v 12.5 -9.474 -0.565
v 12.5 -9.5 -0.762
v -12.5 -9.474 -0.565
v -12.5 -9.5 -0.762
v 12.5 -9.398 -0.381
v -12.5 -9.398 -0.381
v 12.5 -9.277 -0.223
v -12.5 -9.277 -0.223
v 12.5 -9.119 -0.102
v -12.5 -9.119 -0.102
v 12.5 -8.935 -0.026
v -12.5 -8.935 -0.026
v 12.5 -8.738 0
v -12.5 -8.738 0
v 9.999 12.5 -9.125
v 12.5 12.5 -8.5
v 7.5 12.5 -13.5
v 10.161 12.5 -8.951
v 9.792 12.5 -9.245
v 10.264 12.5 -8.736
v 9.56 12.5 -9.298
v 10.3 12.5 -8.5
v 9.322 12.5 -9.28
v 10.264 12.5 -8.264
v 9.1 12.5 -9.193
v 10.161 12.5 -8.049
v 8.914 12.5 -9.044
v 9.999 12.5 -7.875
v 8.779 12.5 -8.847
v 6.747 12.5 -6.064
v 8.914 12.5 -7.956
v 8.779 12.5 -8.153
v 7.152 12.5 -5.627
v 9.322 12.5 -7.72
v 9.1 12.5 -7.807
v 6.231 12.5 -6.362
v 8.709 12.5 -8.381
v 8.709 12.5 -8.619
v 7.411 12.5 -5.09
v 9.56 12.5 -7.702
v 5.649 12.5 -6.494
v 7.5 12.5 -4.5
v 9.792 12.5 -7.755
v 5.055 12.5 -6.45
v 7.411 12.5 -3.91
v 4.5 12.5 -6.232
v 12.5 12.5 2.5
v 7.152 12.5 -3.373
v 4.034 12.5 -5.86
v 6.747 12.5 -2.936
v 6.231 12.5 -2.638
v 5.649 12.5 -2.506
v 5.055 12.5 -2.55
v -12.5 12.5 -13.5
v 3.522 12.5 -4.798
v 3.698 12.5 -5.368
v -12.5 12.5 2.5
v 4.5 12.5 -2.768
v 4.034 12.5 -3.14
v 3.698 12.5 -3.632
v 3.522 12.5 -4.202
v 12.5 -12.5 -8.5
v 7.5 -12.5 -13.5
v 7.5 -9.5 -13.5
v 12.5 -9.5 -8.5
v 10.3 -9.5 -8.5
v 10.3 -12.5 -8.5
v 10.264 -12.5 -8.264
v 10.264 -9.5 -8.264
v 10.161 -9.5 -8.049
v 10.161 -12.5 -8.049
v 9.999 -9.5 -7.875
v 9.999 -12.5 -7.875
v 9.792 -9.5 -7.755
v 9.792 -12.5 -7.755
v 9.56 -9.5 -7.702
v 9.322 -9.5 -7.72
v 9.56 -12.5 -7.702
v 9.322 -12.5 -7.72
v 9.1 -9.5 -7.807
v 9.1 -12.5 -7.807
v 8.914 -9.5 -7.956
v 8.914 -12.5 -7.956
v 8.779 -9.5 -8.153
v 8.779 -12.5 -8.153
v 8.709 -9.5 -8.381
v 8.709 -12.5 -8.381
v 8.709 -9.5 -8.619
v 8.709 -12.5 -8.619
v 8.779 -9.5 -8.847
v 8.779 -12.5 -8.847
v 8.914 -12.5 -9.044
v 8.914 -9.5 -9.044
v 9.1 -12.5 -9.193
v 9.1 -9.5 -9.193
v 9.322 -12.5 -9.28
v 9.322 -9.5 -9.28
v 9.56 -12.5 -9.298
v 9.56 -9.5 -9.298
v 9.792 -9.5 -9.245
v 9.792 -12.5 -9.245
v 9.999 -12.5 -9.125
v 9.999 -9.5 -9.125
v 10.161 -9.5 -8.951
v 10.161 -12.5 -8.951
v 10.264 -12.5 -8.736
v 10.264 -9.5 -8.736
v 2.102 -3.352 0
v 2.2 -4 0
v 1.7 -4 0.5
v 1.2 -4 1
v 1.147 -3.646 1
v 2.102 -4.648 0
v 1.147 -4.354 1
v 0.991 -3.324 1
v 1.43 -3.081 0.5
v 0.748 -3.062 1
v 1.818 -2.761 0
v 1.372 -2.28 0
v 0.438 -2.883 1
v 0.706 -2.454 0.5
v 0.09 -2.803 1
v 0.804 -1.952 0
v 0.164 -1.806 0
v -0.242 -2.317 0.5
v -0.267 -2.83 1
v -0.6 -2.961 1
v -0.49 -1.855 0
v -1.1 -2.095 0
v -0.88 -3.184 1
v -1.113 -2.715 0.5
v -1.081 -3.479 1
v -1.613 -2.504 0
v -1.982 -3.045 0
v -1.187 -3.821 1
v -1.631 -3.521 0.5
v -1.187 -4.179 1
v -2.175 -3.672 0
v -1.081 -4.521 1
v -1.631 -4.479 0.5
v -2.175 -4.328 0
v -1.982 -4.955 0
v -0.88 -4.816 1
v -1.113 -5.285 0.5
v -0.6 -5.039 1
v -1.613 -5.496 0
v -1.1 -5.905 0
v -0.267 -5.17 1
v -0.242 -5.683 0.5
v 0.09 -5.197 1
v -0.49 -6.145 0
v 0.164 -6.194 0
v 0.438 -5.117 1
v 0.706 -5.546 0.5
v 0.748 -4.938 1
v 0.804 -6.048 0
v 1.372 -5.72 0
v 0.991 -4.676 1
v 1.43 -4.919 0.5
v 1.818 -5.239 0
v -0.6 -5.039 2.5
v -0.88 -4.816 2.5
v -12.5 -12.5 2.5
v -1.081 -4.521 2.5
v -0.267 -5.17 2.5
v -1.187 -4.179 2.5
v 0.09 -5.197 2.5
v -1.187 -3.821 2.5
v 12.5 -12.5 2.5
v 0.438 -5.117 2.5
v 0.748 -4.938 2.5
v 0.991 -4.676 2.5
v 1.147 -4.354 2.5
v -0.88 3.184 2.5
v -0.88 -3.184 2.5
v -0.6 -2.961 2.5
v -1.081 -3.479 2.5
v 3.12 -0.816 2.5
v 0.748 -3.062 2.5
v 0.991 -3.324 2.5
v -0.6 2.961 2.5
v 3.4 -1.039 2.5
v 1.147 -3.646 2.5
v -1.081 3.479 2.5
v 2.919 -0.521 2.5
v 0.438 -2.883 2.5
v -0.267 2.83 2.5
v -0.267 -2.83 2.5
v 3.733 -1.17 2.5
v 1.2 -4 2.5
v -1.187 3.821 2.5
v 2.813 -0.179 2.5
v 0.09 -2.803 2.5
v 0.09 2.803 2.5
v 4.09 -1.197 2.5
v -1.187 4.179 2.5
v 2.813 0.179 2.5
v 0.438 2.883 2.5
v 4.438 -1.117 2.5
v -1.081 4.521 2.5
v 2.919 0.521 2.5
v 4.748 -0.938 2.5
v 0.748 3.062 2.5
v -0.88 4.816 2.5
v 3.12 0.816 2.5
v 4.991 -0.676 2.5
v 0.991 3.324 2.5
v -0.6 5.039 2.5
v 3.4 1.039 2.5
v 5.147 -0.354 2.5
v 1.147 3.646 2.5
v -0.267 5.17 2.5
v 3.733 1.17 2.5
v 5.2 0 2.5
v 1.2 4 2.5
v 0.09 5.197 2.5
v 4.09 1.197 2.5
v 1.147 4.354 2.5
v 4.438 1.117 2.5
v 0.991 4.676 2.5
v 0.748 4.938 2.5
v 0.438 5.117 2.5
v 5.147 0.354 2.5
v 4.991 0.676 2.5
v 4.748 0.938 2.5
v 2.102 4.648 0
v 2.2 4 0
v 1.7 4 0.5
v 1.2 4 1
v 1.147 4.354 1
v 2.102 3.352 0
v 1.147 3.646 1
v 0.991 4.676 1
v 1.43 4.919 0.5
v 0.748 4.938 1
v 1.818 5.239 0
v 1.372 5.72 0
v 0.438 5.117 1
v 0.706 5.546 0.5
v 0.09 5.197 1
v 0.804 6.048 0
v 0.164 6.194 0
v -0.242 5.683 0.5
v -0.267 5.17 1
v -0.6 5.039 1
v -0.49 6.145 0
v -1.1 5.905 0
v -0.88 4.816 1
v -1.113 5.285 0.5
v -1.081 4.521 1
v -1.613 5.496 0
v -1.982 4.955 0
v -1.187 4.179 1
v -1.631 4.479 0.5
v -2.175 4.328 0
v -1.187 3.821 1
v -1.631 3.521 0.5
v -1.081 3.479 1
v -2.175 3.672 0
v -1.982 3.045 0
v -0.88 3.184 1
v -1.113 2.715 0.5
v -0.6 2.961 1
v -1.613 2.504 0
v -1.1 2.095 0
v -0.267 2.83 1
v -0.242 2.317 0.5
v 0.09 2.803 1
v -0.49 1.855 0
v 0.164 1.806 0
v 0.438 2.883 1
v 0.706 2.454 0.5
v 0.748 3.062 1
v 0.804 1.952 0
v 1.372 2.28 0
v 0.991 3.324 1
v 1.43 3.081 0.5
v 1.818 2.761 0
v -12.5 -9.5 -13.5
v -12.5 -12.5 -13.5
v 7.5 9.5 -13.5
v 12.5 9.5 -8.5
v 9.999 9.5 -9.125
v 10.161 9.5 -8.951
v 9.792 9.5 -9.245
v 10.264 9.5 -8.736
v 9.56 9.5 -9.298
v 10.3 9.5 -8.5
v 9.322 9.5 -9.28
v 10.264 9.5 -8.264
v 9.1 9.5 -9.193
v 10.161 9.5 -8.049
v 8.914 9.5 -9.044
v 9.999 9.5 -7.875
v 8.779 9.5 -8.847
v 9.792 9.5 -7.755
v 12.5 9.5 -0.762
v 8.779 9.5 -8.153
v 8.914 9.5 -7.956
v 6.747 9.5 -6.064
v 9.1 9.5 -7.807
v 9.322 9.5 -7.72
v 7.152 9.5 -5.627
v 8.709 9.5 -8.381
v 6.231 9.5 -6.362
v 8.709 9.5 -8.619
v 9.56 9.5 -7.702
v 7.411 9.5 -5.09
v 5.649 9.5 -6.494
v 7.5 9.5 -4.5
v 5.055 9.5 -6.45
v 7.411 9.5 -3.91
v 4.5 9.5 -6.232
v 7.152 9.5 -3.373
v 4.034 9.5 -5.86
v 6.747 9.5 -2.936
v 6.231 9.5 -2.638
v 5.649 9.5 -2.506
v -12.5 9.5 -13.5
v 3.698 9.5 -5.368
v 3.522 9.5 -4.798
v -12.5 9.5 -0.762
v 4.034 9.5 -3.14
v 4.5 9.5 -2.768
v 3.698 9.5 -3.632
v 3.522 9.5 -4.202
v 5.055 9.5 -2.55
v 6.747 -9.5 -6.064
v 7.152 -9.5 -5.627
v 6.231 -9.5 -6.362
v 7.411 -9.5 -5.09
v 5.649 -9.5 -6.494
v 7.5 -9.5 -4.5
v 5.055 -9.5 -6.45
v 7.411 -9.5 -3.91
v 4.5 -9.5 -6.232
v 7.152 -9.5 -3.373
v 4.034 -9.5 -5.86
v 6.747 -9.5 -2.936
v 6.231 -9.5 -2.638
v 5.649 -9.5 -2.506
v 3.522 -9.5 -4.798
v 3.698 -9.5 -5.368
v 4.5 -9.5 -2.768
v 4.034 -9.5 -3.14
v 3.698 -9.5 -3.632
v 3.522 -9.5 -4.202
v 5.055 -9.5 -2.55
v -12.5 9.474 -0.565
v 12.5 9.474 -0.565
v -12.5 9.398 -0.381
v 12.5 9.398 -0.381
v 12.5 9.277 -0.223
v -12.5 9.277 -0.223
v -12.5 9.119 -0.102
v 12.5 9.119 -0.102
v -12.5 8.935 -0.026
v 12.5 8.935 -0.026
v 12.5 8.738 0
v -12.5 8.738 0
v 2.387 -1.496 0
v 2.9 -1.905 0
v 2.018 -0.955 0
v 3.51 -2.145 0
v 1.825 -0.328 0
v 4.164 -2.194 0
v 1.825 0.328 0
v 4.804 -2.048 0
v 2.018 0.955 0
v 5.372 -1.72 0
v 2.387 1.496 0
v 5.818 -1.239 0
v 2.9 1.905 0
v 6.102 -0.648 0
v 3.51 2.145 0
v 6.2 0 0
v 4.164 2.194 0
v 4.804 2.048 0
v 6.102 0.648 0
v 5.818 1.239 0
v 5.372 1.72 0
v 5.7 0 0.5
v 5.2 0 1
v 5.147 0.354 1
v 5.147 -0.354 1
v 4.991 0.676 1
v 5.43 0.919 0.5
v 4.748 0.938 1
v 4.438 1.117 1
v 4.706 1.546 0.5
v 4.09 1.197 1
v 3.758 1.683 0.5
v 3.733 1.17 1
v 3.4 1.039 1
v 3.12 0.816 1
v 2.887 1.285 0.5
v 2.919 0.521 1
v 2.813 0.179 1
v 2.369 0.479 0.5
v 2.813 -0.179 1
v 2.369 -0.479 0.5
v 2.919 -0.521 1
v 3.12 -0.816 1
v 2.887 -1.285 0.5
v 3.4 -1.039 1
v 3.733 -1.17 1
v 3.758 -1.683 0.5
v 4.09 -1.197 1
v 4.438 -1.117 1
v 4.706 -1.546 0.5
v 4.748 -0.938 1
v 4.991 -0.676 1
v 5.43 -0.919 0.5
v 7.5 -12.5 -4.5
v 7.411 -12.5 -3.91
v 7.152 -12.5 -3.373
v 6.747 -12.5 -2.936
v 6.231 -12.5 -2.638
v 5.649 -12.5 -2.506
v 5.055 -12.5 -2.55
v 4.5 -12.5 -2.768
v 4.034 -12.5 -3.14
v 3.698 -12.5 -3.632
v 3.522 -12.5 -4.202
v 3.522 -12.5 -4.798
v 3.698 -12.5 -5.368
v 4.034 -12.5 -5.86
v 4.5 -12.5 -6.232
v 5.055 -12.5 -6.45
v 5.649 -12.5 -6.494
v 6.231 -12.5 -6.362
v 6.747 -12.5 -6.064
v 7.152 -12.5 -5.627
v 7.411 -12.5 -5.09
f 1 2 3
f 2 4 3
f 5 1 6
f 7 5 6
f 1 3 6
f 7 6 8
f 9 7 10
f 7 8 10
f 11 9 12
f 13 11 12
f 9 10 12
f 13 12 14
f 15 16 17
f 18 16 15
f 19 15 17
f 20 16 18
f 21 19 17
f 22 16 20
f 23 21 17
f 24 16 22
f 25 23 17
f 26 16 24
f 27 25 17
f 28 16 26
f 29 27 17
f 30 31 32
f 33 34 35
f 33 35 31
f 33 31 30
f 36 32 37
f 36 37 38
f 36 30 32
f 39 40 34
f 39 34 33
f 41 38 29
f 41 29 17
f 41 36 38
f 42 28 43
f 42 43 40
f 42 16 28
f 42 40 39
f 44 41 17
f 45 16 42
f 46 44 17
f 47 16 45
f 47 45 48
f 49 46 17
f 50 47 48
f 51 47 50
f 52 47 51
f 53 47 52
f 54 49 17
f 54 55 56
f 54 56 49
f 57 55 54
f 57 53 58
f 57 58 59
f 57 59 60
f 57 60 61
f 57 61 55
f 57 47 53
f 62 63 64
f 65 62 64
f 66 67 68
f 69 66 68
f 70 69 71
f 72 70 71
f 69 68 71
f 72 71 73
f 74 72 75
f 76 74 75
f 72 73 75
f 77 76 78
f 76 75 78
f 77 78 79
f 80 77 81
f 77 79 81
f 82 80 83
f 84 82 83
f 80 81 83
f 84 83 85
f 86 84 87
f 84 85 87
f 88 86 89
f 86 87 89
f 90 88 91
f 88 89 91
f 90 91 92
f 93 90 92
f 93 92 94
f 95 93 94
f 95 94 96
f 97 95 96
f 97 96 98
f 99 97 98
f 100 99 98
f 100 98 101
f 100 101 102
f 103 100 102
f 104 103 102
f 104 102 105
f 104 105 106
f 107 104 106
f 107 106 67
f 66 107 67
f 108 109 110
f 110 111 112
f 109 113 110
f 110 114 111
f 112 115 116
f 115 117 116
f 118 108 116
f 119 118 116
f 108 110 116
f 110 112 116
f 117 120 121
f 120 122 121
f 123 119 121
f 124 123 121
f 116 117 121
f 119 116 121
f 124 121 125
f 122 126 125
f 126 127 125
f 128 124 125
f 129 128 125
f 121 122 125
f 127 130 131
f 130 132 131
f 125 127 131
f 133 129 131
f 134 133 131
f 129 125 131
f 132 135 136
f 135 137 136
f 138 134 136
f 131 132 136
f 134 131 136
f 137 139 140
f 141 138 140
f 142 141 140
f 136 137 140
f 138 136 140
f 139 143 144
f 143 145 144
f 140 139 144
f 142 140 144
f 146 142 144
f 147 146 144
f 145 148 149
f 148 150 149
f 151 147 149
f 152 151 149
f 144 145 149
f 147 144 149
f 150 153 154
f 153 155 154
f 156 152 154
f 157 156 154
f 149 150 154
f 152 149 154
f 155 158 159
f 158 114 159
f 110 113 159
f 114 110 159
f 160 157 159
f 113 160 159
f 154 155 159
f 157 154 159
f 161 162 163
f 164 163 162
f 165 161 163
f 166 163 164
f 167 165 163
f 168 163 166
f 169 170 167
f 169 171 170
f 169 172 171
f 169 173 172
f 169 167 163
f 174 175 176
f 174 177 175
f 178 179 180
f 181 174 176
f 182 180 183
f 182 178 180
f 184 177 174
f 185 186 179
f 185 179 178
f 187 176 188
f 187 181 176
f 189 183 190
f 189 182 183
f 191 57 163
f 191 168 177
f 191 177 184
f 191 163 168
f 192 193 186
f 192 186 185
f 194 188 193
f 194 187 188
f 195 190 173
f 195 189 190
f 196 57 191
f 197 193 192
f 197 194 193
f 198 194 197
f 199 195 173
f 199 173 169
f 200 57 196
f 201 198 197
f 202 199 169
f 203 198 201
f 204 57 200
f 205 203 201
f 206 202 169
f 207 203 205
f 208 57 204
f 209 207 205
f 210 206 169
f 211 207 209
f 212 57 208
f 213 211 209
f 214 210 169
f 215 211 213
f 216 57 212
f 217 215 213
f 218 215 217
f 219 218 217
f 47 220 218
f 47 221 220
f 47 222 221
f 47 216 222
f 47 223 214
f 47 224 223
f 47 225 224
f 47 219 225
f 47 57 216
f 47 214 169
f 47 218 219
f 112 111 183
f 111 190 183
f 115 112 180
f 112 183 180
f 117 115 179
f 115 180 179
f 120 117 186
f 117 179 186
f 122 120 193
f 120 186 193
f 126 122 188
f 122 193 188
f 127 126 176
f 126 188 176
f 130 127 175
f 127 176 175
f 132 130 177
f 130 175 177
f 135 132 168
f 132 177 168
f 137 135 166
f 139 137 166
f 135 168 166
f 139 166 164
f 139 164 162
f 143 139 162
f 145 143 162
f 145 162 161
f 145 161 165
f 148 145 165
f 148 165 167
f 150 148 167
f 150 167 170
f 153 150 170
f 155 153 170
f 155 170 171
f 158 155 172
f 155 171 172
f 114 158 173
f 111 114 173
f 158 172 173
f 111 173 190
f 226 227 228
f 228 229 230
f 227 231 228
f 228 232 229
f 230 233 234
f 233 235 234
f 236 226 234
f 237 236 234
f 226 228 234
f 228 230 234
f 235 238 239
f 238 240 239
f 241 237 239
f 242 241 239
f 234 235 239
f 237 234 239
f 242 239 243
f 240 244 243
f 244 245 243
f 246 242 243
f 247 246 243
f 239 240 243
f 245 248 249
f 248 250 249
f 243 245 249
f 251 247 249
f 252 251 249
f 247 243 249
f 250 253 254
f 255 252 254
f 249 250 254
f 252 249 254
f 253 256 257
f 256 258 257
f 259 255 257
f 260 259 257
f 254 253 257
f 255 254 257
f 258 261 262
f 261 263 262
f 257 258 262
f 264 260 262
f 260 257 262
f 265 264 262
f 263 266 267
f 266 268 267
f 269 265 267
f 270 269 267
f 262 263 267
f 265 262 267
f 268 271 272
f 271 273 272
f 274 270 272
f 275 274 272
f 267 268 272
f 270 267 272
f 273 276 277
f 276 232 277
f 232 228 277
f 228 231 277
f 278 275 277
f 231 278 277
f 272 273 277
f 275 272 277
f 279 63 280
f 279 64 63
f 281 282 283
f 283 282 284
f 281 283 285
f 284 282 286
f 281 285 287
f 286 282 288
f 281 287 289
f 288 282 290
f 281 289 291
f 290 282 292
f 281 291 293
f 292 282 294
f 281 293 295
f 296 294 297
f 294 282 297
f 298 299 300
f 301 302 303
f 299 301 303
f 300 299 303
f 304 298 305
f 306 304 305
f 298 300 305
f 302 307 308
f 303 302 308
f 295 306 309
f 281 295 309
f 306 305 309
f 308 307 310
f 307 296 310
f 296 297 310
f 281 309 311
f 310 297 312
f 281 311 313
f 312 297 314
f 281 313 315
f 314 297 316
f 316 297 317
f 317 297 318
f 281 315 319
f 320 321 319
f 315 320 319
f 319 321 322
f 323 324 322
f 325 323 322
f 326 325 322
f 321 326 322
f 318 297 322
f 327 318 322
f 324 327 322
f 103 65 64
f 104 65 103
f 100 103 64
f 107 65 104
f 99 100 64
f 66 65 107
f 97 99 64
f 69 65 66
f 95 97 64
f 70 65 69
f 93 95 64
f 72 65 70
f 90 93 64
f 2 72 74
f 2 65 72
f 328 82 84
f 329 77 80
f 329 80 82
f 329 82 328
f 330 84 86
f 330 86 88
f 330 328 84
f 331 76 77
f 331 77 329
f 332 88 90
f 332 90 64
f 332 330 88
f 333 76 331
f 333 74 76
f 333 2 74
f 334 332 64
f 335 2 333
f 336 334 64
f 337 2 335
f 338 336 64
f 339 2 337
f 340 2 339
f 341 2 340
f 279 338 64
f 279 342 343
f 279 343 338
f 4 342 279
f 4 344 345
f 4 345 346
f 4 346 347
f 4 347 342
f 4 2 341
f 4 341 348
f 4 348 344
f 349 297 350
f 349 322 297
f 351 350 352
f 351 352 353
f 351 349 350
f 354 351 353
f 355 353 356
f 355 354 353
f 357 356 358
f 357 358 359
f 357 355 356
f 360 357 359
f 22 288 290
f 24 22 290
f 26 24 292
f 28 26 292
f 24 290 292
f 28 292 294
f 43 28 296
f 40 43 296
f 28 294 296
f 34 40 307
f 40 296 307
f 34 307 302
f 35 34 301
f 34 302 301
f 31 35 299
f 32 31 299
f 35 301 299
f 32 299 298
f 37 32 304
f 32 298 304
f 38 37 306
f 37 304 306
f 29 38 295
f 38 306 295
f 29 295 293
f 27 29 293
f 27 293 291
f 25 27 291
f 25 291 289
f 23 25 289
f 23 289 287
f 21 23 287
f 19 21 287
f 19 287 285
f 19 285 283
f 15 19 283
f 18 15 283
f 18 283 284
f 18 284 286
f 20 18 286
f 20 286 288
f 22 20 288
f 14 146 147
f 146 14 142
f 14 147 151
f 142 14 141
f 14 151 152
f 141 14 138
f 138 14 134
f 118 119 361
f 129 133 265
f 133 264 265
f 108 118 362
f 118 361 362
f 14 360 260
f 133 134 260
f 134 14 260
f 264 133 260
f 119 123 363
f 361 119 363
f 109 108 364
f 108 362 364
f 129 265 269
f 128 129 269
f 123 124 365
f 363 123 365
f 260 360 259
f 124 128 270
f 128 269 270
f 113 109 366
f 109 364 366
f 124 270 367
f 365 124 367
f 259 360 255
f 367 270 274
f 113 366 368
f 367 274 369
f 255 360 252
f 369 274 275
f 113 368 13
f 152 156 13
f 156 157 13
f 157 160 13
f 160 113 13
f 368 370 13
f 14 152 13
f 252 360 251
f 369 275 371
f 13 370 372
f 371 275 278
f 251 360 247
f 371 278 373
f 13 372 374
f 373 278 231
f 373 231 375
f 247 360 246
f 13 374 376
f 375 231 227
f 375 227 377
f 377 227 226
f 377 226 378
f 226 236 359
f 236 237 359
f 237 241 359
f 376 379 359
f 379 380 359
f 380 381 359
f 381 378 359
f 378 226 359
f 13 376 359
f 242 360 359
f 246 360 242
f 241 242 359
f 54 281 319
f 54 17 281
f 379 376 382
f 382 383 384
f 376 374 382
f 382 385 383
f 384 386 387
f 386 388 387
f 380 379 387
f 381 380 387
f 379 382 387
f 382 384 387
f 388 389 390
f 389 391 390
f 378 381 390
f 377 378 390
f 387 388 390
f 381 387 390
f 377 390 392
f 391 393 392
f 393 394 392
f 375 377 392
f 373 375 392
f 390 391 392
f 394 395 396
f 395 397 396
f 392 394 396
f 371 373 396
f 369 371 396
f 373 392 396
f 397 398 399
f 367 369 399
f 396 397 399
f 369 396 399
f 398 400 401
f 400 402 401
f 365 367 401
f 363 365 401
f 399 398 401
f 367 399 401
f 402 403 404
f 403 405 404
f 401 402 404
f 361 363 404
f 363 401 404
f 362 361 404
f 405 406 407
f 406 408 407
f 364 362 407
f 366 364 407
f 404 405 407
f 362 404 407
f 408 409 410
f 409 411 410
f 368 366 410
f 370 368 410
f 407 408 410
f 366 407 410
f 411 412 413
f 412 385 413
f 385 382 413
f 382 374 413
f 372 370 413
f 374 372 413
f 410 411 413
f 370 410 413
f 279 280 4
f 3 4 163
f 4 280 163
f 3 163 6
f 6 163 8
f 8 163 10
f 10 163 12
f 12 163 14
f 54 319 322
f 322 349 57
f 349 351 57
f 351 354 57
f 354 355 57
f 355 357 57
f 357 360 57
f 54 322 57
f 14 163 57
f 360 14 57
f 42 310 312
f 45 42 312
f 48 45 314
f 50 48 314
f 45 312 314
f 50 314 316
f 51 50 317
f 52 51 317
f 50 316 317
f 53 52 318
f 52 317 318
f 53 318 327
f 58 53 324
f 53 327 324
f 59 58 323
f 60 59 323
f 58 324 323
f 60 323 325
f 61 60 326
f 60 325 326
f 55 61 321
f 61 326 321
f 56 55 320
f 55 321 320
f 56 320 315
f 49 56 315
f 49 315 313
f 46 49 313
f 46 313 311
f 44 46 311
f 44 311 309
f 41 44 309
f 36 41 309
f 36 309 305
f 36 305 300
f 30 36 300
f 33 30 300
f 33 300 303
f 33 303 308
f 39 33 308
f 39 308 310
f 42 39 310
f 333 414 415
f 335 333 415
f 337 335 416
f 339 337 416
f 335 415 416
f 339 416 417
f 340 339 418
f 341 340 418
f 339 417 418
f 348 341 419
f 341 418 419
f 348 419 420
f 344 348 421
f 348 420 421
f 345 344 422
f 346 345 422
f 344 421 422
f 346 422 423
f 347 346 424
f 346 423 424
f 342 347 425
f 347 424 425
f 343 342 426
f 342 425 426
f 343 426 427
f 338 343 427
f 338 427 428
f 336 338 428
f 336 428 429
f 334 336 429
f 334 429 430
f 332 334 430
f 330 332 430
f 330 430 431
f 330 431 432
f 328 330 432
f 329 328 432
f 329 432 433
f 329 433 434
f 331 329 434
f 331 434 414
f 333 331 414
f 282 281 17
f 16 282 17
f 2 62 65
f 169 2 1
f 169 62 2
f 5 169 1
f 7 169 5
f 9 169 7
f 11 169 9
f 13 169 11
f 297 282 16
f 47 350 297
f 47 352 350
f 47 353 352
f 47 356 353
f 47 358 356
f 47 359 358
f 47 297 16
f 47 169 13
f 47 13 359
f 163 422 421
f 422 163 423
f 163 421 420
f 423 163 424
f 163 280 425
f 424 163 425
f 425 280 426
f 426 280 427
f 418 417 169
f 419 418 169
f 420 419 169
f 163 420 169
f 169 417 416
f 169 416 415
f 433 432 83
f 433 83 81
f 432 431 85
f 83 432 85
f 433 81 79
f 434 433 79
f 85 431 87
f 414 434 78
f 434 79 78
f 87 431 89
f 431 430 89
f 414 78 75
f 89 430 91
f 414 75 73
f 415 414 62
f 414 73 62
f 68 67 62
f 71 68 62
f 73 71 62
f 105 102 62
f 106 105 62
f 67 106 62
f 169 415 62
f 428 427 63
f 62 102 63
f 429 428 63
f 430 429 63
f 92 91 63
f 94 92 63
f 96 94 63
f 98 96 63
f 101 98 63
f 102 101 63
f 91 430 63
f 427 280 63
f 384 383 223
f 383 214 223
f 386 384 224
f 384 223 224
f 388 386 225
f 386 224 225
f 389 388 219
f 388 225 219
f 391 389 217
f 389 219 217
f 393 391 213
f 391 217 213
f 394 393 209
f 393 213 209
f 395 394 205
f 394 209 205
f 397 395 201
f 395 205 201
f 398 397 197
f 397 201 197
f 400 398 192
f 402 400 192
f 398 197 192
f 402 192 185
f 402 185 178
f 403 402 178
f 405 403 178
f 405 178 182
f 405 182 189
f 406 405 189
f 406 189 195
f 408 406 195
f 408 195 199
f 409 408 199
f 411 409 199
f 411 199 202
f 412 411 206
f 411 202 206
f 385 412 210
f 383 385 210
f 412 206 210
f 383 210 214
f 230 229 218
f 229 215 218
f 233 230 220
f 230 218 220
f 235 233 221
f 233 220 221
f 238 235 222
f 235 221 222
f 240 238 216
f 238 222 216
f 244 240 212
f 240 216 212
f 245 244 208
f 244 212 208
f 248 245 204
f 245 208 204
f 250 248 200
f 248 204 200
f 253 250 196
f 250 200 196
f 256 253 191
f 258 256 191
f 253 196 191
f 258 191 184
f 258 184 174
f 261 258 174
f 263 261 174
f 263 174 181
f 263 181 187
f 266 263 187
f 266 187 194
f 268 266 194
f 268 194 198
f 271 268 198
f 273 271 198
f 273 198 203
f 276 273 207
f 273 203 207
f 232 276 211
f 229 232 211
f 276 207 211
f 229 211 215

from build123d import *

# Parameters (mm, degrees)
SKETCH1_W                                       = 25
SKETCH1_H                                       = 25
BOSS_EXTRUDE1_DEPTH                             = 2.5
SKETCH2_W                                       = 25
SKETCH2_H                                       = 3
BOSS_EXTRUDE2_DEPTH                             = 13.5
SKETCH10_R                                      = 2
CUT_EXTRUDE1_DEPTH                              = 26
SKETCH10_3_R                                    = 0.8
CUT_EXTRUDE2_DEPTH                              = 26
FILLET1_R                                       = 0.762
CHAMFER1_SIZE                                   = 5
CSK_FOR_M2_FLAT_HEAD_MACHINE_SCREW1_D           = 2.4
CSK_FOR_M2_FLAT_HEAD_MACHINE_SCREW1_CSINK_D     = 4.4
CSK_FOR_M2_FLAT_HEAD_MACHINE_SCREW1_CSINK_ANGLE = 90


with BuildPart() as part:
    # Sketch1 → Boss-Extrude1 (new body)
    with BuildSketch(Plane.XY):
        Rectangle(SKETCH1_W, SKETCH1_H)
    extrude(amount=BOSS_EXTRUDE1_DEPTH)

    # Sketch2 → Boss-Extrude2 (add)
    with BuildSketch(Plane(origin=(0, 0, 0), x_dir=(-1, 0, 0), z_dir=(0, 0, -1))):
        with Locations((0, 11)):
            Rectangle(SKETCH2_W, SKETCH2_H)
        with Locations((0, -11)):
            Rectangle(SKETCH2_W, SKETCH2_H)
    extrude(amount=BOSS_EXTRUDE2_DEPTH)

    # Sketch10 → Cut-Extrude1 (cut, through all)
    with BuildSketch(Plane.XZ.offset(12.5)):
        with Locations((5.5, -4.5)):
            Circle(SKETCH10_R)
    extrude(amount=-CUT_EXTRUDE1_DEPTH, mode=Mode.SUBTRACT)

    # Sketch10<3> → Cut-Extrude2 (cut, through all)
    with BuildSketch(Plane.XZ.offset(12.5)):
        with Locations((9.5, -8.5)):
            Circle(SKETCH10_3_R)
    extrude(amount=-CUT_EXTRUDE2_DEPTH, mode=Mode.SUBTRACT)

    # Fillet1
    fillet1_edges = [part.edges().sort_by_distance(p)[0] for p in [
        (0, 9.5, 0),
        (0, -9.5, 0),
    ]]
    fillet(fillet1_edges, radius=FILLET1_R)

    # Chamfer1
    chamfer1_edges = [part.edges().sort_by_distance(p)[0] for p in [
        (12.5, 11, -13.5),
        (12.5, -11, -13.5),
    ]]
    chamfer(chamfer1_edges, length=CHAMFER1_SIZE)

    # CSK for M2 Flat Head Machine Screw1 (through all)
    with Locations(Plane(origin=(0, 0, 0), x_dir=(-1, 0, 0), z_dir=(0, 0, -1))):
        with Locations((0, 4), (0, -4), (-4, 0)):
            CounterSinkHole(CSK_FOR_M2_FLAT_HEAD_MACHINE_SCREW1_D / 2, CSK_FOR_M2_FLAT_HEAD_MACHINE_SCREW1_CSINK_D / 2, counter_sink_angle=CSK_FOR_M2_FLAT_HEAD_MACHINE_SCREW1_CSINK_ANGLE)


solid = part.part
